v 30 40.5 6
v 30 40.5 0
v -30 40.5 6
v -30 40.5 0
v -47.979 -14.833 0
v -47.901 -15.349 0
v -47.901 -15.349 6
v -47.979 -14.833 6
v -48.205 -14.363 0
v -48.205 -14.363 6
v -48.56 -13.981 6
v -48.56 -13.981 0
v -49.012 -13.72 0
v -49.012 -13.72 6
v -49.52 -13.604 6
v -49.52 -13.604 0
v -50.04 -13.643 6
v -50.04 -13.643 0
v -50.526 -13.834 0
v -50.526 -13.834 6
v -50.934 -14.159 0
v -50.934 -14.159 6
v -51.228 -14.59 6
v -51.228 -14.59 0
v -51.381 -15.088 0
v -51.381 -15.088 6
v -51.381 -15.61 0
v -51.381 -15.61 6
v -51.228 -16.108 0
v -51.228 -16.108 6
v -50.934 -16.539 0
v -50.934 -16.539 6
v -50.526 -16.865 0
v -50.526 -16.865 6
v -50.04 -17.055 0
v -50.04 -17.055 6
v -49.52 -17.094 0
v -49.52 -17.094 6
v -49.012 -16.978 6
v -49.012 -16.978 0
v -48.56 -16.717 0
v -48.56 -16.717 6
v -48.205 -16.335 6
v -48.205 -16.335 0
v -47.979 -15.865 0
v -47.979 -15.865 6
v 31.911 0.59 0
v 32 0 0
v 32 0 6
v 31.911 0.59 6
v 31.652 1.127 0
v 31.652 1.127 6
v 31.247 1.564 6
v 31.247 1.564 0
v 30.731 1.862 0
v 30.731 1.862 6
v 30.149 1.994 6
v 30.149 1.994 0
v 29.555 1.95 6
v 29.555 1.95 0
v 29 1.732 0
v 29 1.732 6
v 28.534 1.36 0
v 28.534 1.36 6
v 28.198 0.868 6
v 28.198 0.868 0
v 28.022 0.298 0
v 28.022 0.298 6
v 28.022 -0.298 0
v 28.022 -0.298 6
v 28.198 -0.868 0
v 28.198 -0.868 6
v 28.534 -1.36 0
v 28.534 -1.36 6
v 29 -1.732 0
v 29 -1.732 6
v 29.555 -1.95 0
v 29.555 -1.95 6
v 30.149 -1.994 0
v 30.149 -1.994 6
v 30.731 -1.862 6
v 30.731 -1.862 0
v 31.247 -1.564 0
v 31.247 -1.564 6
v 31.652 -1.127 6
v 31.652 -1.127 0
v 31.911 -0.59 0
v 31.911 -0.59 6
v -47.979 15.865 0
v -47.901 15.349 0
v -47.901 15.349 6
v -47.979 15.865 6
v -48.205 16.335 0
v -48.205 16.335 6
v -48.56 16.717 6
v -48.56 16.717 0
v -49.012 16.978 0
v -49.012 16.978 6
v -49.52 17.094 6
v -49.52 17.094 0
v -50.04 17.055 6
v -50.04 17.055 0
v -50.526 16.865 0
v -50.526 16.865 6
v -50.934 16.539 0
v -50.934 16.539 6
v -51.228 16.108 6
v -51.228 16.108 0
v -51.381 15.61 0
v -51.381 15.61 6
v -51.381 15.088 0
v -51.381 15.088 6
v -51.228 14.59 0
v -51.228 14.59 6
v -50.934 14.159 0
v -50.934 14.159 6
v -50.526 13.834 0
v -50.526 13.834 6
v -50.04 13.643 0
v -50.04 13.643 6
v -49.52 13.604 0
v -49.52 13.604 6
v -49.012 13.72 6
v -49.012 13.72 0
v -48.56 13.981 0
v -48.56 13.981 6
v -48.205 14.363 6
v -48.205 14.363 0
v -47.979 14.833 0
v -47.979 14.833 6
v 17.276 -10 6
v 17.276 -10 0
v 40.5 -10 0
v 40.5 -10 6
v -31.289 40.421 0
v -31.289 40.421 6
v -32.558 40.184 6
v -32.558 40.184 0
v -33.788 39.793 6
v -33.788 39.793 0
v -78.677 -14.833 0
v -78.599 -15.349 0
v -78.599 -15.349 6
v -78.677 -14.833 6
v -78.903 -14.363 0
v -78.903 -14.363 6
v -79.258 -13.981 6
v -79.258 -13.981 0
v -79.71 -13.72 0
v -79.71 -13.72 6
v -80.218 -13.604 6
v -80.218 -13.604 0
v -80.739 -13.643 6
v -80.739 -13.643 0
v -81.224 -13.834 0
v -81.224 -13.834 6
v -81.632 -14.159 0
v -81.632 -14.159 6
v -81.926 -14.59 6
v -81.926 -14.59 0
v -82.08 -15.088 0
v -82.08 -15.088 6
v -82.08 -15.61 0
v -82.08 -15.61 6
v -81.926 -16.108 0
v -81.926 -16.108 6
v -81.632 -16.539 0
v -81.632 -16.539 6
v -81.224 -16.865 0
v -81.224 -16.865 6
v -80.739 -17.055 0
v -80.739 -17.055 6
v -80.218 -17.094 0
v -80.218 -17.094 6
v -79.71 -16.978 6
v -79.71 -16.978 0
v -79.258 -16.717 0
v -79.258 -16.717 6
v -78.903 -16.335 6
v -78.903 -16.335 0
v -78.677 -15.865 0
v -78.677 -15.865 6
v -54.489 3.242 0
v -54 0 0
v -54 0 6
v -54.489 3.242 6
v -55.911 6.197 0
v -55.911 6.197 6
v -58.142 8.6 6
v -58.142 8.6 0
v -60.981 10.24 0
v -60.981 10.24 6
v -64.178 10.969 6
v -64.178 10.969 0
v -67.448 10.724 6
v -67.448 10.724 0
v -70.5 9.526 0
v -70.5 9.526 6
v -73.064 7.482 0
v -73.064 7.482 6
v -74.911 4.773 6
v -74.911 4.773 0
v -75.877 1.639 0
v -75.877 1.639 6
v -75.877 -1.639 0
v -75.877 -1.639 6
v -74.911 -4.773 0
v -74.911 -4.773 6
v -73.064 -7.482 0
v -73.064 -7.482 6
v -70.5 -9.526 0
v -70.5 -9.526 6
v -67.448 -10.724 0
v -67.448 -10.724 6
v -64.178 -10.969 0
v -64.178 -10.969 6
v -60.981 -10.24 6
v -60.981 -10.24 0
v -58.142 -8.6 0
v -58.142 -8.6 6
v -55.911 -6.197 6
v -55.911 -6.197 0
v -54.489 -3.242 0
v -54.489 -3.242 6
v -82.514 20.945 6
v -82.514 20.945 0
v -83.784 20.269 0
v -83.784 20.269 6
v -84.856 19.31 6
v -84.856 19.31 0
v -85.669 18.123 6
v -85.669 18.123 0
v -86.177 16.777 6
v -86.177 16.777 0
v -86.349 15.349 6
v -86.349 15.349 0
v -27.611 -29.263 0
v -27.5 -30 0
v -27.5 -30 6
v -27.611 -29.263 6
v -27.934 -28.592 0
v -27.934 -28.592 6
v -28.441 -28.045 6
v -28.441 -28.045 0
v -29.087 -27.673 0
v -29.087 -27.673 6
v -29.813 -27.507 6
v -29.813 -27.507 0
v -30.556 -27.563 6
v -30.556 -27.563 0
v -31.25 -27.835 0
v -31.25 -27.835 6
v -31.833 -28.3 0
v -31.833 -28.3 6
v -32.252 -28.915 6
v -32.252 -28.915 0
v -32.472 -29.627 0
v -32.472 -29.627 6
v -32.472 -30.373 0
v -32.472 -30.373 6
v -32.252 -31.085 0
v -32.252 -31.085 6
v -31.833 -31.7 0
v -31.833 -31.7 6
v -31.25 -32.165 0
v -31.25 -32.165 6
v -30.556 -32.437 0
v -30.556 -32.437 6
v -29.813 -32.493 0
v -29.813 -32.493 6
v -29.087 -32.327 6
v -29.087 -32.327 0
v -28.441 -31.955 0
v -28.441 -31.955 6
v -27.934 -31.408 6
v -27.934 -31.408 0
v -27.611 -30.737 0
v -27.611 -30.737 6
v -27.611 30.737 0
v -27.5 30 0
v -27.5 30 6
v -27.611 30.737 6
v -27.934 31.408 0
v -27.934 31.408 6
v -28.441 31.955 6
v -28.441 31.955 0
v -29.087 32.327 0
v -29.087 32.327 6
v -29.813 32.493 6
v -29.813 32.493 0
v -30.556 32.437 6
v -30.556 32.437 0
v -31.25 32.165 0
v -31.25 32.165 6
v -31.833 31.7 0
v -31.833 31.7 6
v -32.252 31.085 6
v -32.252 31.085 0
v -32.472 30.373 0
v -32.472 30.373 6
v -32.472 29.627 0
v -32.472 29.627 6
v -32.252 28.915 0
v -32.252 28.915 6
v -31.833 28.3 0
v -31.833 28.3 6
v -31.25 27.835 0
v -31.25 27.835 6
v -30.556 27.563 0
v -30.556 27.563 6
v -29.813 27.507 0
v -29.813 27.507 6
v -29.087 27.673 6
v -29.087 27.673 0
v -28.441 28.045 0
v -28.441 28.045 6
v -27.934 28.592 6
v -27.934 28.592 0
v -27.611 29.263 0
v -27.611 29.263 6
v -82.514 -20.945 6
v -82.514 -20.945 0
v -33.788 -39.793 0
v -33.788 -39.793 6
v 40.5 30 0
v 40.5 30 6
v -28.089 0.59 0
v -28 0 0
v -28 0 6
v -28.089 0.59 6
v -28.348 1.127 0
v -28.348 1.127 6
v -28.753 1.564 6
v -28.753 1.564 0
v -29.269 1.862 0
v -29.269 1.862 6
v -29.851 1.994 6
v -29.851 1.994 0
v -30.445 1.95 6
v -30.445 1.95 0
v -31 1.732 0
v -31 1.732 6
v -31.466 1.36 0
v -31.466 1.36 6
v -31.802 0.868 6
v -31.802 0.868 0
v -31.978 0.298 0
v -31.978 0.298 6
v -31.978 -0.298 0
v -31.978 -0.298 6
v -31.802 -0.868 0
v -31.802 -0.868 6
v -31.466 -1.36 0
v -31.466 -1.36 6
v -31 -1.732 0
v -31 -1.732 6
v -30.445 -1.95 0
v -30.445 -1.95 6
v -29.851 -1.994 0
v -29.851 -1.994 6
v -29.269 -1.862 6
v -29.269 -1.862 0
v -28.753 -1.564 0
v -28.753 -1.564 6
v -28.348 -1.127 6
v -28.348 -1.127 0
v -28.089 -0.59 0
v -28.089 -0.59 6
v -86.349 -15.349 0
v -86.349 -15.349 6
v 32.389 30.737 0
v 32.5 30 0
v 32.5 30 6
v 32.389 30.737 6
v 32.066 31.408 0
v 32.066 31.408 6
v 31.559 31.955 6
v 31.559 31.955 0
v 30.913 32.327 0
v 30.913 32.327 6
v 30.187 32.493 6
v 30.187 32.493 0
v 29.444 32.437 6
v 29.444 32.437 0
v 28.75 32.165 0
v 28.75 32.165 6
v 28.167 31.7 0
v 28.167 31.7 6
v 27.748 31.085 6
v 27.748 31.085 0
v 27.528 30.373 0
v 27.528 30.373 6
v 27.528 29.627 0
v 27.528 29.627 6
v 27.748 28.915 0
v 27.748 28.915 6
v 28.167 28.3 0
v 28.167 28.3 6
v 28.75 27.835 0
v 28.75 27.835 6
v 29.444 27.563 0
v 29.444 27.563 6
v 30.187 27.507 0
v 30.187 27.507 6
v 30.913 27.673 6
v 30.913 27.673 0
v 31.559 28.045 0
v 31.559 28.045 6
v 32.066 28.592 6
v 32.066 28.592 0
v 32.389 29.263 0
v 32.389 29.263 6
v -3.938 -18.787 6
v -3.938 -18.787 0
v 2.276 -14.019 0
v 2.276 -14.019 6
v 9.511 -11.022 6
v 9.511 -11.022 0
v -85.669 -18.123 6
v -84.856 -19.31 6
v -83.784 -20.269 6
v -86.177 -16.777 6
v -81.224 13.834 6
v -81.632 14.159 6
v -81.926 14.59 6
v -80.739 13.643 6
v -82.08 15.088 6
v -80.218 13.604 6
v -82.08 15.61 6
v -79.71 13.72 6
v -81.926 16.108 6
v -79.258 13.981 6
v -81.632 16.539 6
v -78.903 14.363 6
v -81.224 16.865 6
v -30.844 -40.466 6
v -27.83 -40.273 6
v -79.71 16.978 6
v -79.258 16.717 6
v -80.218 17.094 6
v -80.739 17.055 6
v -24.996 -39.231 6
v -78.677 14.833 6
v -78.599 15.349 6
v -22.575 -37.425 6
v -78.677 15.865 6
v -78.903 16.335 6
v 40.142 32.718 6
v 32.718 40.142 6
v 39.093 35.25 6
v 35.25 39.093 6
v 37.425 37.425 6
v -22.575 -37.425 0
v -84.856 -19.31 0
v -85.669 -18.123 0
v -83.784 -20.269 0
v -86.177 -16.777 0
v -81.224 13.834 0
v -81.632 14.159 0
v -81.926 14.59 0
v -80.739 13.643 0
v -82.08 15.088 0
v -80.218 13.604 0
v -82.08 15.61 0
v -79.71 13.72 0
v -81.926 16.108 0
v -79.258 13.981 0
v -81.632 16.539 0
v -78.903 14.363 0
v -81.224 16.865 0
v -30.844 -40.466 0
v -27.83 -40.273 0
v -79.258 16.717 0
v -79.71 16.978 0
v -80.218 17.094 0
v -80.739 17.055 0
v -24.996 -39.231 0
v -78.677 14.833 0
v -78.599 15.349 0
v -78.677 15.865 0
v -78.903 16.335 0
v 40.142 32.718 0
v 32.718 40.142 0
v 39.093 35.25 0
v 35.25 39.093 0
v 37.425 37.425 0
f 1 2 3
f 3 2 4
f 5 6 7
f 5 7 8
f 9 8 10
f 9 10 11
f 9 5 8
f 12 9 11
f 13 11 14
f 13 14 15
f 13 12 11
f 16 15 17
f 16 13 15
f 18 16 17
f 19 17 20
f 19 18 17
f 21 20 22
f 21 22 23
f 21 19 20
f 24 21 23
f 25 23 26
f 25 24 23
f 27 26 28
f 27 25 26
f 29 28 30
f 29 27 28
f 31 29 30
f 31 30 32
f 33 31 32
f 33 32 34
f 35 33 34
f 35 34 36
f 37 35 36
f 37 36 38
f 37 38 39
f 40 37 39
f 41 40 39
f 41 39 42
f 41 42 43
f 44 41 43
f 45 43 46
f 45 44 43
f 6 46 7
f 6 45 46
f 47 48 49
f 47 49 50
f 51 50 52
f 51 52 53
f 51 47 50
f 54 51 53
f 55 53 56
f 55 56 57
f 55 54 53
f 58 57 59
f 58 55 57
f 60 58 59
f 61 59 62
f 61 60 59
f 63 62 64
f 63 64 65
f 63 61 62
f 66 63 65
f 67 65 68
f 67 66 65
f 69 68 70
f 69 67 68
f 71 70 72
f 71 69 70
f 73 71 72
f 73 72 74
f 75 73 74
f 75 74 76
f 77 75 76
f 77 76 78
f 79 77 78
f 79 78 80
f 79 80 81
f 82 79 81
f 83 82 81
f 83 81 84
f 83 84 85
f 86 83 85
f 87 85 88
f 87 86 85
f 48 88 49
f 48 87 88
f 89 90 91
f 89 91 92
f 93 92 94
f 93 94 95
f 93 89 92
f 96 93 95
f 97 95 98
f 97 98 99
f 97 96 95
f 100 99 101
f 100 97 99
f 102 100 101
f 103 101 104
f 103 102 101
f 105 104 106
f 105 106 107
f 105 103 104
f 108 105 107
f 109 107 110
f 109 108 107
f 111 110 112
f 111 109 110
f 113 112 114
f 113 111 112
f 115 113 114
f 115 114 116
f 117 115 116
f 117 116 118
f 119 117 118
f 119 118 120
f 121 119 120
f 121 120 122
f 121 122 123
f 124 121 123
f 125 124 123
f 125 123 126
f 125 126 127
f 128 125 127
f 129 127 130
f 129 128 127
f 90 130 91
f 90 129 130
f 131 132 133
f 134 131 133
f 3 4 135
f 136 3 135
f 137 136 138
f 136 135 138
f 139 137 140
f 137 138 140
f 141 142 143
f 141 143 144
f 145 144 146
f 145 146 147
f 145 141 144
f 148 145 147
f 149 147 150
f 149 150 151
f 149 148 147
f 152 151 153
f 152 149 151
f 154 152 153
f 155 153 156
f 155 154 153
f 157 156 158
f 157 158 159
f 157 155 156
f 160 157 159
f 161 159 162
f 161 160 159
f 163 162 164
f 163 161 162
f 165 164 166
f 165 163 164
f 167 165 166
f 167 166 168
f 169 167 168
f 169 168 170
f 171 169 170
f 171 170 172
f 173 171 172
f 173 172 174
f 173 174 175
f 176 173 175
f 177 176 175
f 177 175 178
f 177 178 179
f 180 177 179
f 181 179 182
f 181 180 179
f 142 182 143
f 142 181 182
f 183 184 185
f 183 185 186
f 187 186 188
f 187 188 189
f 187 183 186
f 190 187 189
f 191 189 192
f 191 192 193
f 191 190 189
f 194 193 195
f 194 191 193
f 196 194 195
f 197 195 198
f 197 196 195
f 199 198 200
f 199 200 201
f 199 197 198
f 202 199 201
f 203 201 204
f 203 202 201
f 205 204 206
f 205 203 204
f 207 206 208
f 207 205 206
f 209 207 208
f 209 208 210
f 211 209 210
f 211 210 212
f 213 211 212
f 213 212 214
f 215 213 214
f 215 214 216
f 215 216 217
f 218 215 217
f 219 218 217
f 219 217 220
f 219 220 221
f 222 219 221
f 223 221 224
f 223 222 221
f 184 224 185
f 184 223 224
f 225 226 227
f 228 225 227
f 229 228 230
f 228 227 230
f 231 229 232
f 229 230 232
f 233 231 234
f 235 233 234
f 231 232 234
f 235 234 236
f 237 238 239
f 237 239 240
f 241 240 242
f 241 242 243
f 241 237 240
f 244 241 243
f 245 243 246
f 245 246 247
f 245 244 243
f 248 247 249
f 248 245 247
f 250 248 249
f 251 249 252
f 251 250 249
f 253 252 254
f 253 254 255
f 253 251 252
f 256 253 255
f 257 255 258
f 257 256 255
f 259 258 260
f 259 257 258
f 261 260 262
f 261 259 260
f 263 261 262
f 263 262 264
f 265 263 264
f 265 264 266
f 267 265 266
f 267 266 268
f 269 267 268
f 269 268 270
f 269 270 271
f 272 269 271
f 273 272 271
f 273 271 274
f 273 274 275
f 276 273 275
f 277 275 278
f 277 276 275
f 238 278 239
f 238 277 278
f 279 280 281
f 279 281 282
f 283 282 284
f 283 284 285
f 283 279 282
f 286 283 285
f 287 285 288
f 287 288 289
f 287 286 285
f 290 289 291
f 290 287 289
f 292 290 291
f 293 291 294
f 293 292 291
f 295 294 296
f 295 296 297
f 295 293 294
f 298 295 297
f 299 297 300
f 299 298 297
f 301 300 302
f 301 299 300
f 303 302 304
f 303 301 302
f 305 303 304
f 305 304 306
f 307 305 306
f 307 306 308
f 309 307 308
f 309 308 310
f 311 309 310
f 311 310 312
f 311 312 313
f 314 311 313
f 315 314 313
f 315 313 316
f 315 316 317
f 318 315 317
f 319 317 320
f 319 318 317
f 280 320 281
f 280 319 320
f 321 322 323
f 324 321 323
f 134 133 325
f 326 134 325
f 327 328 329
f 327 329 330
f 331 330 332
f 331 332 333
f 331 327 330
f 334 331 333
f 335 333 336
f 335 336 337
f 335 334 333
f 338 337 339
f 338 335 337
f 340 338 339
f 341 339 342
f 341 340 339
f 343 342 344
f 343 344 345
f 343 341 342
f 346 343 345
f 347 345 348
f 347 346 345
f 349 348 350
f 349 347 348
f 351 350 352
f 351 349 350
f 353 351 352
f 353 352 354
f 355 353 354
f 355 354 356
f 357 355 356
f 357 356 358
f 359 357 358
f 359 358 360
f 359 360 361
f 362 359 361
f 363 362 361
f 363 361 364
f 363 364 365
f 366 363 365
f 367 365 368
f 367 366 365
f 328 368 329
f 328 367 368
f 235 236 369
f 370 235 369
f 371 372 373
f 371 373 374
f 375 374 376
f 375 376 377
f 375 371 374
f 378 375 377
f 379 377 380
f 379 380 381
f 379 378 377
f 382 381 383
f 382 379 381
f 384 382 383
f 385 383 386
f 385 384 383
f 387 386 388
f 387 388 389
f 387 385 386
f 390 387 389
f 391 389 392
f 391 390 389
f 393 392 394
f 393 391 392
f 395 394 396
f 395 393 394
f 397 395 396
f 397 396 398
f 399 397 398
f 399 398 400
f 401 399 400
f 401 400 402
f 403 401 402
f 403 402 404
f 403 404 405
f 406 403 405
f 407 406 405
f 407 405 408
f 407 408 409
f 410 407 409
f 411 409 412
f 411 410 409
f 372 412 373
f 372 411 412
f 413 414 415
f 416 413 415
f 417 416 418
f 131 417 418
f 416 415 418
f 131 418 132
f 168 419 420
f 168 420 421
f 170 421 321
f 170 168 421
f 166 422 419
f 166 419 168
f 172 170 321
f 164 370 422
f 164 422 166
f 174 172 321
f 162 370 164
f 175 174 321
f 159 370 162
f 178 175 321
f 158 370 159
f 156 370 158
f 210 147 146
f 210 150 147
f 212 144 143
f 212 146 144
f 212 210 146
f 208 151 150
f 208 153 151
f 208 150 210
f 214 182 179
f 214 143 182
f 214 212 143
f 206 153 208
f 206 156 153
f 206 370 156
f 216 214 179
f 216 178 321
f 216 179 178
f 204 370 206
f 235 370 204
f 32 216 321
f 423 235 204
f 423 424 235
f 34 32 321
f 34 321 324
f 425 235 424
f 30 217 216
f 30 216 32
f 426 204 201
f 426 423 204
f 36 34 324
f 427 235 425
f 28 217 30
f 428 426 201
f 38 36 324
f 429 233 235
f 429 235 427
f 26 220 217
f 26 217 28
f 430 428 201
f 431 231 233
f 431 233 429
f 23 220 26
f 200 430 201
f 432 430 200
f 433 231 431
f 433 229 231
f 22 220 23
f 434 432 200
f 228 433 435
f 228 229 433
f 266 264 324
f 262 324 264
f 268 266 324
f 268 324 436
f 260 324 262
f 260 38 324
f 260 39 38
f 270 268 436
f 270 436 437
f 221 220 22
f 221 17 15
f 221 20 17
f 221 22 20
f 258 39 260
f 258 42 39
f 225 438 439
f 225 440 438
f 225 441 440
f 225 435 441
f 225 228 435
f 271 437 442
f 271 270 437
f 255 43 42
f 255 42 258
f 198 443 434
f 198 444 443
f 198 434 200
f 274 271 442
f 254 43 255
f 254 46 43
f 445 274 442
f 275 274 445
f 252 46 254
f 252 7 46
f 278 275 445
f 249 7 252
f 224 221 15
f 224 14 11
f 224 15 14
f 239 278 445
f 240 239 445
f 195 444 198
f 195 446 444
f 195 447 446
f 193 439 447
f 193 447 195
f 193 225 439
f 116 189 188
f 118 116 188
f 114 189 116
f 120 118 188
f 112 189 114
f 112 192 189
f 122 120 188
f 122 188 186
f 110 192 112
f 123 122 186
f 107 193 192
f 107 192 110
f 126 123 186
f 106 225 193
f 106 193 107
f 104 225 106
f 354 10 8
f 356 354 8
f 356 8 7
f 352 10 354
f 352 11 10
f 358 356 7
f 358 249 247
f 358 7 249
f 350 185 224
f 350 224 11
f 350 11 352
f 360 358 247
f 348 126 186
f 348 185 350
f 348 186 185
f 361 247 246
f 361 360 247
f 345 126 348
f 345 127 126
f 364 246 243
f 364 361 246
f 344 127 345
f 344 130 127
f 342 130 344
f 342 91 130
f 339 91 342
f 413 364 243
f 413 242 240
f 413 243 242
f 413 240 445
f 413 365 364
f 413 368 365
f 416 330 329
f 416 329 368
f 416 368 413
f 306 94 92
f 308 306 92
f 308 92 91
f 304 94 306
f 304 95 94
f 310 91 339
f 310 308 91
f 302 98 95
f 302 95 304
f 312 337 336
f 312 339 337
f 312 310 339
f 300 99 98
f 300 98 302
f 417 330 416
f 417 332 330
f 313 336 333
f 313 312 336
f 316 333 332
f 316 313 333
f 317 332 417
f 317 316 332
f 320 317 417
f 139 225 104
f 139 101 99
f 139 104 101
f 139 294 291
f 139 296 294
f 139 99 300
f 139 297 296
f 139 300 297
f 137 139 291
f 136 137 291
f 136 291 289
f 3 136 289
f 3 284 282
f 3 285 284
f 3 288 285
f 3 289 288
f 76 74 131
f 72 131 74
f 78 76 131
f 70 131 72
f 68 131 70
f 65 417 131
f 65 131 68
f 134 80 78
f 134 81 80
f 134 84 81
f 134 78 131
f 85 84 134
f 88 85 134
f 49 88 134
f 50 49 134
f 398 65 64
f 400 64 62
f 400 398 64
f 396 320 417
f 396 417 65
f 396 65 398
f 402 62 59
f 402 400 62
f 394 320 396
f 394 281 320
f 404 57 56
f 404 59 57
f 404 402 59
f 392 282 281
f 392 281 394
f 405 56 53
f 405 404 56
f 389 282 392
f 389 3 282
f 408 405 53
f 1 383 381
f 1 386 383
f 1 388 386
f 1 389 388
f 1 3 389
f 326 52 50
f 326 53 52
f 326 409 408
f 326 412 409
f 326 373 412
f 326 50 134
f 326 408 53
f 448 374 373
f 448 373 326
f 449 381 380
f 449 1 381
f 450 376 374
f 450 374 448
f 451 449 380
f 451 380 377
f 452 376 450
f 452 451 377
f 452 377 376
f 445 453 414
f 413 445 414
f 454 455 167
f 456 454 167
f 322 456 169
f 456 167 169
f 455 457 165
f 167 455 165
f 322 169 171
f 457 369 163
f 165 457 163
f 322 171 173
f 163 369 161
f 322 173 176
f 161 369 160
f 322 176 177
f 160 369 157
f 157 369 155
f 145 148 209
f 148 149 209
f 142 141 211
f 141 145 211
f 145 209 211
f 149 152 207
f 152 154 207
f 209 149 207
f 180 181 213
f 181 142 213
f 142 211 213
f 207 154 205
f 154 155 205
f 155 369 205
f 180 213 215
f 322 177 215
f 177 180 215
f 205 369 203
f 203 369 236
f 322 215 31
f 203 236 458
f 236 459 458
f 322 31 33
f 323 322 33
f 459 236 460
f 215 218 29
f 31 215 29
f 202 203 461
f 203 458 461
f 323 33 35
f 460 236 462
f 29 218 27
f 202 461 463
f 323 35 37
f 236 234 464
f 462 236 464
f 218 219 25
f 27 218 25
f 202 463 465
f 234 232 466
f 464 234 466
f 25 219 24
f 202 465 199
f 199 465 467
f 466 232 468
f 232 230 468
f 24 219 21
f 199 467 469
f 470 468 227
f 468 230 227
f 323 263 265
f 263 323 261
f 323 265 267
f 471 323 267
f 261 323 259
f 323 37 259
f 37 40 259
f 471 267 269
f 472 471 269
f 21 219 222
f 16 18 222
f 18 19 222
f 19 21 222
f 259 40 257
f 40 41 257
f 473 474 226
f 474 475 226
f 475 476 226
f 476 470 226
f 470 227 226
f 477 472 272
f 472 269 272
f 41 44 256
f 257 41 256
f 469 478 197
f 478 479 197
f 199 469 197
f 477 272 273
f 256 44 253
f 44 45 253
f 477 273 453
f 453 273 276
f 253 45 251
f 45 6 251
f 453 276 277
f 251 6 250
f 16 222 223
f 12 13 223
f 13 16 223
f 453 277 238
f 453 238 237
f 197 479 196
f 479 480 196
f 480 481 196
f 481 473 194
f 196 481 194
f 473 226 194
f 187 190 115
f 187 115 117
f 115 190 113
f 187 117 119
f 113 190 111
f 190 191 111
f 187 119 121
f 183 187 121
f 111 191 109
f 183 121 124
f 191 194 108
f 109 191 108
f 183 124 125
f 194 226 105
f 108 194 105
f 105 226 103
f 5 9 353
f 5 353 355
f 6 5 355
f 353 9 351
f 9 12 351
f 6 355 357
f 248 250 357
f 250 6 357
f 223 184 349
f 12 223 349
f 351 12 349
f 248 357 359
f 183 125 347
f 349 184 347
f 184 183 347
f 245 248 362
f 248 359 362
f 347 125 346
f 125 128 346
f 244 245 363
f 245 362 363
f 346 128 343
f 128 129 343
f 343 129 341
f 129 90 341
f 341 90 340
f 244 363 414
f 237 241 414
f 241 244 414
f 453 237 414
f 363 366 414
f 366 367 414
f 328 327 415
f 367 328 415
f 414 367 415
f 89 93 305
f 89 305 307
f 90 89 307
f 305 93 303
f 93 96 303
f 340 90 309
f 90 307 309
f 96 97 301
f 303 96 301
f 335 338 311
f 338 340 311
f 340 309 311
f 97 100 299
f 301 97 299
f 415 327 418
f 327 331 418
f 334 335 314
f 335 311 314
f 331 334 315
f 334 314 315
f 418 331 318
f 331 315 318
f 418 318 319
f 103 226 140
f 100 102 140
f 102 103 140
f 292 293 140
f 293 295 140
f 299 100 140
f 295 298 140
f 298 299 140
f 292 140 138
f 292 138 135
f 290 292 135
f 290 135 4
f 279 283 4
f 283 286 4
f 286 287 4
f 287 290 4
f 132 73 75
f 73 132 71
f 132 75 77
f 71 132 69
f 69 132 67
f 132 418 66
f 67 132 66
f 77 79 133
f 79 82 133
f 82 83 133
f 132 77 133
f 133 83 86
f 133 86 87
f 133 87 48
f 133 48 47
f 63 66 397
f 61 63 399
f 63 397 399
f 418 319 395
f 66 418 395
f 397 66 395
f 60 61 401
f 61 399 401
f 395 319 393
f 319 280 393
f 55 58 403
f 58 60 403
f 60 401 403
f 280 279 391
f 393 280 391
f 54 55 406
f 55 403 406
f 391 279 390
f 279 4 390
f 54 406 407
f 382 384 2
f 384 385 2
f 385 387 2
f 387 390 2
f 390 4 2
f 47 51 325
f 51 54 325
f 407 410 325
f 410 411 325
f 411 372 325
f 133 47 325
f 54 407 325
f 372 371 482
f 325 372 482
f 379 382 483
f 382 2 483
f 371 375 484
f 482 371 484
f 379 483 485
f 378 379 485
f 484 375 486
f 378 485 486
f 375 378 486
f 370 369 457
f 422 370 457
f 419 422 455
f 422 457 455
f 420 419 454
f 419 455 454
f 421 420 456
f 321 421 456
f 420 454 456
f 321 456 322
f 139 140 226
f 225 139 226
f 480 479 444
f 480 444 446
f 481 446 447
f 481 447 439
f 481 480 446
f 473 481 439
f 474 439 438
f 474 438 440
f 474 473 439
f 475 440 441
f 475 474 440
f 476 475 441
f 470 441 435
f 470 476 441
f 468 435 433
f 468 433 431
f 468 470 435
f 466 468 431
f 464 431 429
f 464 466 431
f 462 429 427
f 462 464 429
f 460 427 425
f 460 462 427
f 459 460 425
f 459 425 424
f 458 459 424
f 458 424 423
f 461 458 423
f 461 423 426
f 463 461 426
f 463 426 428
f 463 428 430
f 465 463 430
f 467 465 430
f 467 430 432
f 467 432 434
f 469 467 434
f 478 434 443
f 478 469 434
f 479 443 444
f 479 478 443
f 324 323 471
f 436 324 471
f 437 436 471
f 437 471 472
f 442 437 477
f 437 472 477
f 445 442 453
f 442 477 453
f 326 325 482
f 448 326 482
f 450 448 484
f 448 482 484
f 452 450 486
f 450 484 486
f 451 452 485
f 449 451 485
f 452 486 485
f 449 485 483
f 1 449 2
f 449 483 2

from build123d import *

# Parameters (mm, degrees)
ESBO_O1_R                = 2.5
ESBO_O1_R_2              = 1.75
ESBO_O1_R_3              = 11
ESBO_O1_R_4              = 2
RESSALTO_EXTRUS_O1_DEPTH = 6


with BuildPart() as part:
    # Esboço1 → Ressalto-extrusão1 (new body)
    with BuildSketch(Plane.XY):
        with BuildLine():
            Line((-22.575378798, -37.424621202), (-3.937554159, -18.786796564))
            ThreePointArc((-3.937554159, -18.786796564), (5.795146305, -12.283614025), (17.275649276, -10))
            Line((17.275649276, -10), (40.5, -10))
            Line((40.5, -10), (40.5, 30))
            ThreePointArc((40.5, 30), (37.424621202, 37.424621202), (30, 40.5))
            Line((30, 40.5), (-30, 40.5))
            ThreePointArc((-30, 40.5), (-31.926738888, 40.321709028), (-33.788045366, 39.792890906))
            Line((-33.788045366, 39.792890906), (-82.513696647, 20.945036955))
            ThreePointArc((-82.513696647, 20.945036955), (-85.298219626, 18.741179474), (-86.349099295, 15.349099295))
            Line((-86.349099295, 15.349099295), (-86.349099295, -15.349099295))
            ThreePointArc((-86.349099295, -15.349099295), (-85.298219626, -18.741179474), (-82.513696647, -20.945036955))
            Line((-82.513696647, -20.945036955), (-33.788045366, -39.792890906))
            ThreePointArc((-33.788045366, -39.792890906), (-27.830127584, -40.273346762), (-22.575378798, -37.424621202))
        make_face()
        with Locations((-30, 30)):
            Circle(ESBO_O1_R, mode=Mode.SUBTRACT)
        with Locations((-30, -30)):
            Circle(ESBO_O1_R, mode=Mode.SUBTRACT)
        with Locations((30, 30)):
            Circle(ESBO_O1_R, mode=Mode.SUBTRACT)
        with Locations((-80.349099295, 15.349099295)):
            Circle(ESBO_O1_R_2, mode=Mode.SUBTRACT)
        with Locations((-49.650900705, 15.349099295)):
            Circle(ESBO_O1_R_2, mode=Mode.SUBTRACT)
        with Locations((-49.650900705, -15.349099295)):
            Circle(ESBO_O1_R_2, mode=Mode.SUBTRACT)
        with Locations((-80.349099295, -15.349099295)):
            Circle(ESBO_O1_R_2, mode=Mode.SUBTRACT)
        with Locations((-65, 0)):
            Circle(ESBO_O1_R_3, mode=Mode.SUBTRACT)
        with Locations((-30, 0)):
            Circle(ESBO_O1_R_4, mode=Mode.SUBTRACT)
        with Locations((30, 0)):
            Circle(ESBO_O1_R_4, mode=Mode.SUBTRACT)
    extrude(amount=RESSALTO_EXTRUS_O1_DEPTH)


solid = part.part
